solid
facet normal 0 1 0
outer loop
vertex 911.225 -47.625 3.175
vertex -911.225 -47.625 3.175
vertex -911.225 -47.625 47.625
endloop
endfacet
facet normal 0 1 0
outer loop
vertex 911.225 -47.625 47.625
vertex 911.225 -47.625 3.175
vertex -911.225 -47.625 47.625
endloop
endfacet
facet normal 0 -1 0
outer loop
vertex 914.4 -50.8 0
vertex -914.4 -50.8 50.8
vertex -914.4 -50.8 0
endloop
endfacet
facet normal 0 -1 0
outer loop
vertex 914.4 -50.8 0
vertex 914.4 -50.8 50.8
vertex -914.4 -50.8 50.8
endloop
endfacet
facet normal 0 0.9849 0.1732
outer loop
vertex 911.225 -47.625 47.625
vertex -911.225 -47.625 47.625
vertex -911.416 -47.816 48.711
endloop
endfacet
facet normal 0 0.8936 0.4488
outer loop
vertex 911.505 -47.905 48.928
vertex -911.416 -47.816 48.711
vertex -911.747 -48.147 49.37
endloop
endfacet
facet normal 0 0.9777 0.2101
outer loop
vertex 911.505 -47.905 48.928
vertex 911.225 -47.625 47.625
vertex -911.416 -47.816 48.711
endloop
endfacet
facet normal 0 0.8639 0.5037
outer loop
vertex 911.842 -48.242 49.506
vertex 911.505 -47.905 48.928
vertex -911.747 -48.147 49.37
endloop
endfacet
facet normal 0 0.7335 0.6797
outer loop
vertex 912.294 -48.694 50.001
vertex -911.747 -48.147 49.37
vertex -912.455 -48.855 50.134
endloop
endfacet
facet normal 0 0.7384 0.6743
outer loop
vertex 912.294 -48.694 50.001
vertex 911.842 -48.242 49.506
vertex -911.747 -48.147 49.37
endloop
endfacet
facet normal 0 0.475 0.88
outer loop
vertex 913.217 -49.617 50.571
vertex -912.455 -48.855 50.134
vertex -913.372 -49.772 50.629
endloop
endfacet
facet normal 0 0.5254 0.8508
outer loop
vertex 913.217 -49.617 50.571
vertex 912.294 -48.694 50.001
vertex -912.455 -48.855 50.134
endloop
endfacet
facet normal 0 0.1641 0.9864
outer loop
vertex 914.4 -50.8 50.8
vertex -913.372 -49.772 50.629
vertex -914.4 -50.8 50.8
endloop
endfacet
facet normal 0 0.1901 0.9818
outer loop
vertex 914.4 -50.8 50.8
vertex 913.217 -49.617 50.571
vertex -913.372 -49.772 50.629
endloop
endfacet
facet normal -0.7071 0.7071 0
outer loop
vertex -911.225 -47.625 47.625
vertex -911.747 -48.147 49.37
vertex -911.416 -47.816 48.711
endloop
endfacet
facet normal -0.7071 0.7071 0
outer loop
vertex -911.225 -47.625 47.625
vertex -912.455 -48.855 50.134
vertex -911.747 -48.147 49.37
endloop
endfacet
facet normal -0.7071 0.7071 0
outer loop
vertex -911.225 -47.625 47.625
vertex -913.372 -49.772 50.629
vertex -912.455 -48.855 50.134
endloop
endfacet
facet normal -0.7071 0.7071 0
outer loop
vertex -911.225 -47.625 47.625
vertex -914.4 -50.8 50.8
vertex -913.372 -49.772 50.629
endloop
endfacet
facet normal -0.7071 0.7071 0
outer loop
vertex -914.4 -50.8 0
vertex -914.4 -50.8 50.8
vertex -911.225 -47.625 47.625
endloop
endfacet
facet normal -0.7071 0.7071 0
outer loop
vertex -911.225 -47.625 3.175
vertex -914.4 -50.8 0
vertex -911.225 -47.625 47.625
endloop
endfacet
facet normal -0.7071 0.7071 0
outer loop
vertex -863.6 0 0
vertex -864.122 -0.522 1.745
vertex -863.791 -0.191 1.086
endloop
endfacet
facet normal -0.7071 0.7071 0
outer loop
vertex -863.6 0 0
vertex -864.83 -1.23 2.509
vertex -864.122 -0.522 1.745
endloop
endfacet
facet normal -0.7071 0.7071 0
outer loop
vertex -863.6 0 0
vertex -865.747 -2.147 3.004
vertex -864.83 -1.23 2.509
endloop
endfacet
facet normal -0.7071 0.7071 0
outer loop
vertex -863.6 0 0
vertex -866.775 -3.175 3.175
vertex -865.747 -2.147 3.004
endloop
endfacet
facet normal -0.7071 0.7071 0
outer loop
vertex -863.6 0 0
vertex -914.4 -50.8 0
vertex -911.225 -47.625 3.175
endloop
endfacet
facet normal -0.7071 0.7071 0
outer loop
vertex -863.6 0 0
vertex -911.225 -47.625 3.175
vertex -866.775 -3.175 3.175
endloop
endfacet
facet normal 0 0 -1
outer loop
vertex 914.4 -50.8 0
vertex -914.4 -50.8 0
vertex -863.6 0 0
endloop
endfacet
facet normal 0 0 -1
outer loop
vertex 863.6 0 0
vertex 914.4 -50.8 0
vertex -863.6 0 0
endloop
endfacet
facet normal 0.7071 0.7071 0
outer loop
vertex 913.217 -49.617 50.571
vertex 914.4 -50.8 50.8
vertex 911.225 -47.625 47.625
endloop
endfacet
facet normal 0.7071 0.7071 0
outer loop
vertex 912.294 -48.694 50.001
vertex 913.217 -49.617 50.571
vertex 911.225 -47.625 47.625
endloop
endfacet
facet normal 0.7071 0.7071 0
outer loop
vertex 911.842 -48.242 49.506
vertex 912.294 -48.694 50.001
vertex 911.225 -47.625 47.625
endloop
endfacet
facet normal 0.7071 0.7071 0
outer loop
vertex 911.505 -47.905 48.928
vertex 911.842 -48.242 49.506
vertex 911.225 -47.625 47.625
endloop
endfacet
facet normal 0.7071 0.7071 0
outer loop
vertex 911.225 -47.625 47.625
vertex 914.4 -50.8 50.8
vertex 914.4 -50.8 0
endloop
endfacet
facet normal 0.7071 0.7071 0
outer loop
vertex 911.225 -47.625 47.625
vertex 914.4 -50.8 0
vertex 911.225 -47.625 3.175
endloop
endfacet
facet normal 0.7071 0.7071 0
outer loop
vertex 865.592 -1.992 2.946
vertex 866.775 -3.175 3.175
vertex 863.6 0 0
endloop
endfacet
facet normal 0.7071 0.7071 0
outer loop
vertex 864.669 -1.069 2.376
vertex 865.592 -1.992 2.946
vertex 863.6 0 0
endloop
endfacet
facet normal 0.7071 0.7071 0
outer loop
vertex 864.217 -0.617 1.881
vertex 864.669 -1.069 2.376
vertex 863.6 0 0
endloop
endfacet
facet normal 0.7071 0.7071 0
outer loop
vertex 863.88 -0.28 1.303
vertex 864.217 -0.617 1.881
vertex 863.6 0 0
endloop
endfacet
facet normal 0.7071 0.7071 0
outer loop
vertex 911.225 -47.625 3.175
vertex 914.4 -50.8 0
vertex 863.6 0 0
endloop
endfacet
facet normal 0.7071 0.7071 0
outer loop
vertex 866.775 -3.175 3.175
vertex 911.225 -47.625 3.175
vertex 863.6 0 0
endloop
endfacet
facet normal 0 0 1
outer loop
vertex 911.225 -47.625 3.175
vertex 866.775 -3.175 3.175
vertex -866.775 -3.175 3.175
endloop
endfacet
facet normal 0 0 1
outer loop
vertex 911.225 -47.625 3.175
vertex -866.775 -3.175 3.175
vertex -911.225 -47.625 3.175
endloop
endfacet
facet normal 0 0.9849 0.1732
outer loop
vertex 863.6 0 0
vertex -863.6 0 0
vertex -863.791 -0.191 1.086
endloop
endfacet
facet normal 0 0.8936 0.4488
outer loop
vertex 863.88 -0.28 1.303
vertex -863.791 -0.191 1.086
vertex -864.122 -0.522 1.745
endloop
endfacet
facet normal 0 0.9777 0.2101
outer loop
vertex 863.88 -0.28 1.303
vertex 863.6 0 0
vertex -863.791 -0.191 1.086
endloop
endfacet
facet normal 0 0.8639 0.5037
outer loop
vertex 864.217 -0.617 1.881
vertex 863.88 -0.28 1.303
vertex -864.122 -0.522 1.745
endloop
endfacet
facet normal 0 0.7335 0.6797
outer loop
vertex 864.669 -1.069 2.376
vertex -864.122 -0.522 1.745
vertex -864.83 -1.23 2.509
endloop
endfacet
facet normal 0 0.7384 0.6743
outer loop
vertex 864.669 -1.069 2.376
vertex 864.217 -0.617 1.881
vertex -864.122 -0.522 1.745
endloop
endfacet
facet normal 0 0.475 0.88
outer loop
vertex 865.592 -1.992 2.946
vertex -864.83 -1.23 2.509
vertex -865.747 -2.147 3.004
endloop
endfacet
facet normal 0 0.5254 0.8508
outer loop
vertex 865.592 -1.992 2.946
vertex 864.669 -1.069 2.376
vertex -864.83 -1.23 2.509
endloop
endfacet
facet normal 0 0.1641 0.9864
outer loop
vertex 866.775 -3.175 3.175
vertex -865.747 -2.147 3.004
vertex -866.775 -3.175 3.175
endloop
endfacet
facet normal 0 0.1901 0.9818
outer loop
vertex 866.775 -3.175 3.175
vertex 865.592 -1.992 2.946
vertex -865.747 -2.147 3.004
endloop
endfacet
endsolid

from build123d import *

# Parameters (mm, degrees)
F1_DEPTH = 914.4
F3_DEPTH = 76.2


# Not quite as in the source:
# - a pattern or mirror of a feature is missing from the dataset's text; its kind, count and spacing are read off the source's solid


with BuildPart() as f1:
    # F0 (on Right) → F1 (new body, symmetric)
    with BuildSketch(Plane.YZ):
        with BuildLine():
            Line((-50.8, 0), (0, 0))
            ThreePointArc((0, 0), (-0.9299359697, 2.2450640303), (-3.175, 3.175))
            Line((-3.175, 3.175), (-47.625, 3.175))
            Line((-47.625, 3.175), (-47.625, 47.625))
            ThreePointArc((-47.625, 47.625), (-48.5549359697, 49.8700640303), (-50.8, 50.8))
            Line((-50.8, 50.8), (-50.8, 0))
        make_face()
    extrude(amount=F1_DEPTH, both=True)

    # F2 (on face) → F3 (cut)
    with BuildSketch(Plane(origin=(0, 0, 0), x_dir=(1, 0, 0), z_dir=(0, 0, -1))):
        Polygon((914.4, 50.8), (863.6, 0), (914.4, 0), align=None)
    f3 = extrude(amount=-F3_DEPTH, mode=Mode.SUBTRACT)

    # F3_copies: F3 across plane
    add(f3.mirror(Plane(origin=(0, 0, 0), x_dir=(0, 0, -1), z_dir=(-1, 0, 0))), mode=Mode.SUBTRACT)


solid = f1.part
